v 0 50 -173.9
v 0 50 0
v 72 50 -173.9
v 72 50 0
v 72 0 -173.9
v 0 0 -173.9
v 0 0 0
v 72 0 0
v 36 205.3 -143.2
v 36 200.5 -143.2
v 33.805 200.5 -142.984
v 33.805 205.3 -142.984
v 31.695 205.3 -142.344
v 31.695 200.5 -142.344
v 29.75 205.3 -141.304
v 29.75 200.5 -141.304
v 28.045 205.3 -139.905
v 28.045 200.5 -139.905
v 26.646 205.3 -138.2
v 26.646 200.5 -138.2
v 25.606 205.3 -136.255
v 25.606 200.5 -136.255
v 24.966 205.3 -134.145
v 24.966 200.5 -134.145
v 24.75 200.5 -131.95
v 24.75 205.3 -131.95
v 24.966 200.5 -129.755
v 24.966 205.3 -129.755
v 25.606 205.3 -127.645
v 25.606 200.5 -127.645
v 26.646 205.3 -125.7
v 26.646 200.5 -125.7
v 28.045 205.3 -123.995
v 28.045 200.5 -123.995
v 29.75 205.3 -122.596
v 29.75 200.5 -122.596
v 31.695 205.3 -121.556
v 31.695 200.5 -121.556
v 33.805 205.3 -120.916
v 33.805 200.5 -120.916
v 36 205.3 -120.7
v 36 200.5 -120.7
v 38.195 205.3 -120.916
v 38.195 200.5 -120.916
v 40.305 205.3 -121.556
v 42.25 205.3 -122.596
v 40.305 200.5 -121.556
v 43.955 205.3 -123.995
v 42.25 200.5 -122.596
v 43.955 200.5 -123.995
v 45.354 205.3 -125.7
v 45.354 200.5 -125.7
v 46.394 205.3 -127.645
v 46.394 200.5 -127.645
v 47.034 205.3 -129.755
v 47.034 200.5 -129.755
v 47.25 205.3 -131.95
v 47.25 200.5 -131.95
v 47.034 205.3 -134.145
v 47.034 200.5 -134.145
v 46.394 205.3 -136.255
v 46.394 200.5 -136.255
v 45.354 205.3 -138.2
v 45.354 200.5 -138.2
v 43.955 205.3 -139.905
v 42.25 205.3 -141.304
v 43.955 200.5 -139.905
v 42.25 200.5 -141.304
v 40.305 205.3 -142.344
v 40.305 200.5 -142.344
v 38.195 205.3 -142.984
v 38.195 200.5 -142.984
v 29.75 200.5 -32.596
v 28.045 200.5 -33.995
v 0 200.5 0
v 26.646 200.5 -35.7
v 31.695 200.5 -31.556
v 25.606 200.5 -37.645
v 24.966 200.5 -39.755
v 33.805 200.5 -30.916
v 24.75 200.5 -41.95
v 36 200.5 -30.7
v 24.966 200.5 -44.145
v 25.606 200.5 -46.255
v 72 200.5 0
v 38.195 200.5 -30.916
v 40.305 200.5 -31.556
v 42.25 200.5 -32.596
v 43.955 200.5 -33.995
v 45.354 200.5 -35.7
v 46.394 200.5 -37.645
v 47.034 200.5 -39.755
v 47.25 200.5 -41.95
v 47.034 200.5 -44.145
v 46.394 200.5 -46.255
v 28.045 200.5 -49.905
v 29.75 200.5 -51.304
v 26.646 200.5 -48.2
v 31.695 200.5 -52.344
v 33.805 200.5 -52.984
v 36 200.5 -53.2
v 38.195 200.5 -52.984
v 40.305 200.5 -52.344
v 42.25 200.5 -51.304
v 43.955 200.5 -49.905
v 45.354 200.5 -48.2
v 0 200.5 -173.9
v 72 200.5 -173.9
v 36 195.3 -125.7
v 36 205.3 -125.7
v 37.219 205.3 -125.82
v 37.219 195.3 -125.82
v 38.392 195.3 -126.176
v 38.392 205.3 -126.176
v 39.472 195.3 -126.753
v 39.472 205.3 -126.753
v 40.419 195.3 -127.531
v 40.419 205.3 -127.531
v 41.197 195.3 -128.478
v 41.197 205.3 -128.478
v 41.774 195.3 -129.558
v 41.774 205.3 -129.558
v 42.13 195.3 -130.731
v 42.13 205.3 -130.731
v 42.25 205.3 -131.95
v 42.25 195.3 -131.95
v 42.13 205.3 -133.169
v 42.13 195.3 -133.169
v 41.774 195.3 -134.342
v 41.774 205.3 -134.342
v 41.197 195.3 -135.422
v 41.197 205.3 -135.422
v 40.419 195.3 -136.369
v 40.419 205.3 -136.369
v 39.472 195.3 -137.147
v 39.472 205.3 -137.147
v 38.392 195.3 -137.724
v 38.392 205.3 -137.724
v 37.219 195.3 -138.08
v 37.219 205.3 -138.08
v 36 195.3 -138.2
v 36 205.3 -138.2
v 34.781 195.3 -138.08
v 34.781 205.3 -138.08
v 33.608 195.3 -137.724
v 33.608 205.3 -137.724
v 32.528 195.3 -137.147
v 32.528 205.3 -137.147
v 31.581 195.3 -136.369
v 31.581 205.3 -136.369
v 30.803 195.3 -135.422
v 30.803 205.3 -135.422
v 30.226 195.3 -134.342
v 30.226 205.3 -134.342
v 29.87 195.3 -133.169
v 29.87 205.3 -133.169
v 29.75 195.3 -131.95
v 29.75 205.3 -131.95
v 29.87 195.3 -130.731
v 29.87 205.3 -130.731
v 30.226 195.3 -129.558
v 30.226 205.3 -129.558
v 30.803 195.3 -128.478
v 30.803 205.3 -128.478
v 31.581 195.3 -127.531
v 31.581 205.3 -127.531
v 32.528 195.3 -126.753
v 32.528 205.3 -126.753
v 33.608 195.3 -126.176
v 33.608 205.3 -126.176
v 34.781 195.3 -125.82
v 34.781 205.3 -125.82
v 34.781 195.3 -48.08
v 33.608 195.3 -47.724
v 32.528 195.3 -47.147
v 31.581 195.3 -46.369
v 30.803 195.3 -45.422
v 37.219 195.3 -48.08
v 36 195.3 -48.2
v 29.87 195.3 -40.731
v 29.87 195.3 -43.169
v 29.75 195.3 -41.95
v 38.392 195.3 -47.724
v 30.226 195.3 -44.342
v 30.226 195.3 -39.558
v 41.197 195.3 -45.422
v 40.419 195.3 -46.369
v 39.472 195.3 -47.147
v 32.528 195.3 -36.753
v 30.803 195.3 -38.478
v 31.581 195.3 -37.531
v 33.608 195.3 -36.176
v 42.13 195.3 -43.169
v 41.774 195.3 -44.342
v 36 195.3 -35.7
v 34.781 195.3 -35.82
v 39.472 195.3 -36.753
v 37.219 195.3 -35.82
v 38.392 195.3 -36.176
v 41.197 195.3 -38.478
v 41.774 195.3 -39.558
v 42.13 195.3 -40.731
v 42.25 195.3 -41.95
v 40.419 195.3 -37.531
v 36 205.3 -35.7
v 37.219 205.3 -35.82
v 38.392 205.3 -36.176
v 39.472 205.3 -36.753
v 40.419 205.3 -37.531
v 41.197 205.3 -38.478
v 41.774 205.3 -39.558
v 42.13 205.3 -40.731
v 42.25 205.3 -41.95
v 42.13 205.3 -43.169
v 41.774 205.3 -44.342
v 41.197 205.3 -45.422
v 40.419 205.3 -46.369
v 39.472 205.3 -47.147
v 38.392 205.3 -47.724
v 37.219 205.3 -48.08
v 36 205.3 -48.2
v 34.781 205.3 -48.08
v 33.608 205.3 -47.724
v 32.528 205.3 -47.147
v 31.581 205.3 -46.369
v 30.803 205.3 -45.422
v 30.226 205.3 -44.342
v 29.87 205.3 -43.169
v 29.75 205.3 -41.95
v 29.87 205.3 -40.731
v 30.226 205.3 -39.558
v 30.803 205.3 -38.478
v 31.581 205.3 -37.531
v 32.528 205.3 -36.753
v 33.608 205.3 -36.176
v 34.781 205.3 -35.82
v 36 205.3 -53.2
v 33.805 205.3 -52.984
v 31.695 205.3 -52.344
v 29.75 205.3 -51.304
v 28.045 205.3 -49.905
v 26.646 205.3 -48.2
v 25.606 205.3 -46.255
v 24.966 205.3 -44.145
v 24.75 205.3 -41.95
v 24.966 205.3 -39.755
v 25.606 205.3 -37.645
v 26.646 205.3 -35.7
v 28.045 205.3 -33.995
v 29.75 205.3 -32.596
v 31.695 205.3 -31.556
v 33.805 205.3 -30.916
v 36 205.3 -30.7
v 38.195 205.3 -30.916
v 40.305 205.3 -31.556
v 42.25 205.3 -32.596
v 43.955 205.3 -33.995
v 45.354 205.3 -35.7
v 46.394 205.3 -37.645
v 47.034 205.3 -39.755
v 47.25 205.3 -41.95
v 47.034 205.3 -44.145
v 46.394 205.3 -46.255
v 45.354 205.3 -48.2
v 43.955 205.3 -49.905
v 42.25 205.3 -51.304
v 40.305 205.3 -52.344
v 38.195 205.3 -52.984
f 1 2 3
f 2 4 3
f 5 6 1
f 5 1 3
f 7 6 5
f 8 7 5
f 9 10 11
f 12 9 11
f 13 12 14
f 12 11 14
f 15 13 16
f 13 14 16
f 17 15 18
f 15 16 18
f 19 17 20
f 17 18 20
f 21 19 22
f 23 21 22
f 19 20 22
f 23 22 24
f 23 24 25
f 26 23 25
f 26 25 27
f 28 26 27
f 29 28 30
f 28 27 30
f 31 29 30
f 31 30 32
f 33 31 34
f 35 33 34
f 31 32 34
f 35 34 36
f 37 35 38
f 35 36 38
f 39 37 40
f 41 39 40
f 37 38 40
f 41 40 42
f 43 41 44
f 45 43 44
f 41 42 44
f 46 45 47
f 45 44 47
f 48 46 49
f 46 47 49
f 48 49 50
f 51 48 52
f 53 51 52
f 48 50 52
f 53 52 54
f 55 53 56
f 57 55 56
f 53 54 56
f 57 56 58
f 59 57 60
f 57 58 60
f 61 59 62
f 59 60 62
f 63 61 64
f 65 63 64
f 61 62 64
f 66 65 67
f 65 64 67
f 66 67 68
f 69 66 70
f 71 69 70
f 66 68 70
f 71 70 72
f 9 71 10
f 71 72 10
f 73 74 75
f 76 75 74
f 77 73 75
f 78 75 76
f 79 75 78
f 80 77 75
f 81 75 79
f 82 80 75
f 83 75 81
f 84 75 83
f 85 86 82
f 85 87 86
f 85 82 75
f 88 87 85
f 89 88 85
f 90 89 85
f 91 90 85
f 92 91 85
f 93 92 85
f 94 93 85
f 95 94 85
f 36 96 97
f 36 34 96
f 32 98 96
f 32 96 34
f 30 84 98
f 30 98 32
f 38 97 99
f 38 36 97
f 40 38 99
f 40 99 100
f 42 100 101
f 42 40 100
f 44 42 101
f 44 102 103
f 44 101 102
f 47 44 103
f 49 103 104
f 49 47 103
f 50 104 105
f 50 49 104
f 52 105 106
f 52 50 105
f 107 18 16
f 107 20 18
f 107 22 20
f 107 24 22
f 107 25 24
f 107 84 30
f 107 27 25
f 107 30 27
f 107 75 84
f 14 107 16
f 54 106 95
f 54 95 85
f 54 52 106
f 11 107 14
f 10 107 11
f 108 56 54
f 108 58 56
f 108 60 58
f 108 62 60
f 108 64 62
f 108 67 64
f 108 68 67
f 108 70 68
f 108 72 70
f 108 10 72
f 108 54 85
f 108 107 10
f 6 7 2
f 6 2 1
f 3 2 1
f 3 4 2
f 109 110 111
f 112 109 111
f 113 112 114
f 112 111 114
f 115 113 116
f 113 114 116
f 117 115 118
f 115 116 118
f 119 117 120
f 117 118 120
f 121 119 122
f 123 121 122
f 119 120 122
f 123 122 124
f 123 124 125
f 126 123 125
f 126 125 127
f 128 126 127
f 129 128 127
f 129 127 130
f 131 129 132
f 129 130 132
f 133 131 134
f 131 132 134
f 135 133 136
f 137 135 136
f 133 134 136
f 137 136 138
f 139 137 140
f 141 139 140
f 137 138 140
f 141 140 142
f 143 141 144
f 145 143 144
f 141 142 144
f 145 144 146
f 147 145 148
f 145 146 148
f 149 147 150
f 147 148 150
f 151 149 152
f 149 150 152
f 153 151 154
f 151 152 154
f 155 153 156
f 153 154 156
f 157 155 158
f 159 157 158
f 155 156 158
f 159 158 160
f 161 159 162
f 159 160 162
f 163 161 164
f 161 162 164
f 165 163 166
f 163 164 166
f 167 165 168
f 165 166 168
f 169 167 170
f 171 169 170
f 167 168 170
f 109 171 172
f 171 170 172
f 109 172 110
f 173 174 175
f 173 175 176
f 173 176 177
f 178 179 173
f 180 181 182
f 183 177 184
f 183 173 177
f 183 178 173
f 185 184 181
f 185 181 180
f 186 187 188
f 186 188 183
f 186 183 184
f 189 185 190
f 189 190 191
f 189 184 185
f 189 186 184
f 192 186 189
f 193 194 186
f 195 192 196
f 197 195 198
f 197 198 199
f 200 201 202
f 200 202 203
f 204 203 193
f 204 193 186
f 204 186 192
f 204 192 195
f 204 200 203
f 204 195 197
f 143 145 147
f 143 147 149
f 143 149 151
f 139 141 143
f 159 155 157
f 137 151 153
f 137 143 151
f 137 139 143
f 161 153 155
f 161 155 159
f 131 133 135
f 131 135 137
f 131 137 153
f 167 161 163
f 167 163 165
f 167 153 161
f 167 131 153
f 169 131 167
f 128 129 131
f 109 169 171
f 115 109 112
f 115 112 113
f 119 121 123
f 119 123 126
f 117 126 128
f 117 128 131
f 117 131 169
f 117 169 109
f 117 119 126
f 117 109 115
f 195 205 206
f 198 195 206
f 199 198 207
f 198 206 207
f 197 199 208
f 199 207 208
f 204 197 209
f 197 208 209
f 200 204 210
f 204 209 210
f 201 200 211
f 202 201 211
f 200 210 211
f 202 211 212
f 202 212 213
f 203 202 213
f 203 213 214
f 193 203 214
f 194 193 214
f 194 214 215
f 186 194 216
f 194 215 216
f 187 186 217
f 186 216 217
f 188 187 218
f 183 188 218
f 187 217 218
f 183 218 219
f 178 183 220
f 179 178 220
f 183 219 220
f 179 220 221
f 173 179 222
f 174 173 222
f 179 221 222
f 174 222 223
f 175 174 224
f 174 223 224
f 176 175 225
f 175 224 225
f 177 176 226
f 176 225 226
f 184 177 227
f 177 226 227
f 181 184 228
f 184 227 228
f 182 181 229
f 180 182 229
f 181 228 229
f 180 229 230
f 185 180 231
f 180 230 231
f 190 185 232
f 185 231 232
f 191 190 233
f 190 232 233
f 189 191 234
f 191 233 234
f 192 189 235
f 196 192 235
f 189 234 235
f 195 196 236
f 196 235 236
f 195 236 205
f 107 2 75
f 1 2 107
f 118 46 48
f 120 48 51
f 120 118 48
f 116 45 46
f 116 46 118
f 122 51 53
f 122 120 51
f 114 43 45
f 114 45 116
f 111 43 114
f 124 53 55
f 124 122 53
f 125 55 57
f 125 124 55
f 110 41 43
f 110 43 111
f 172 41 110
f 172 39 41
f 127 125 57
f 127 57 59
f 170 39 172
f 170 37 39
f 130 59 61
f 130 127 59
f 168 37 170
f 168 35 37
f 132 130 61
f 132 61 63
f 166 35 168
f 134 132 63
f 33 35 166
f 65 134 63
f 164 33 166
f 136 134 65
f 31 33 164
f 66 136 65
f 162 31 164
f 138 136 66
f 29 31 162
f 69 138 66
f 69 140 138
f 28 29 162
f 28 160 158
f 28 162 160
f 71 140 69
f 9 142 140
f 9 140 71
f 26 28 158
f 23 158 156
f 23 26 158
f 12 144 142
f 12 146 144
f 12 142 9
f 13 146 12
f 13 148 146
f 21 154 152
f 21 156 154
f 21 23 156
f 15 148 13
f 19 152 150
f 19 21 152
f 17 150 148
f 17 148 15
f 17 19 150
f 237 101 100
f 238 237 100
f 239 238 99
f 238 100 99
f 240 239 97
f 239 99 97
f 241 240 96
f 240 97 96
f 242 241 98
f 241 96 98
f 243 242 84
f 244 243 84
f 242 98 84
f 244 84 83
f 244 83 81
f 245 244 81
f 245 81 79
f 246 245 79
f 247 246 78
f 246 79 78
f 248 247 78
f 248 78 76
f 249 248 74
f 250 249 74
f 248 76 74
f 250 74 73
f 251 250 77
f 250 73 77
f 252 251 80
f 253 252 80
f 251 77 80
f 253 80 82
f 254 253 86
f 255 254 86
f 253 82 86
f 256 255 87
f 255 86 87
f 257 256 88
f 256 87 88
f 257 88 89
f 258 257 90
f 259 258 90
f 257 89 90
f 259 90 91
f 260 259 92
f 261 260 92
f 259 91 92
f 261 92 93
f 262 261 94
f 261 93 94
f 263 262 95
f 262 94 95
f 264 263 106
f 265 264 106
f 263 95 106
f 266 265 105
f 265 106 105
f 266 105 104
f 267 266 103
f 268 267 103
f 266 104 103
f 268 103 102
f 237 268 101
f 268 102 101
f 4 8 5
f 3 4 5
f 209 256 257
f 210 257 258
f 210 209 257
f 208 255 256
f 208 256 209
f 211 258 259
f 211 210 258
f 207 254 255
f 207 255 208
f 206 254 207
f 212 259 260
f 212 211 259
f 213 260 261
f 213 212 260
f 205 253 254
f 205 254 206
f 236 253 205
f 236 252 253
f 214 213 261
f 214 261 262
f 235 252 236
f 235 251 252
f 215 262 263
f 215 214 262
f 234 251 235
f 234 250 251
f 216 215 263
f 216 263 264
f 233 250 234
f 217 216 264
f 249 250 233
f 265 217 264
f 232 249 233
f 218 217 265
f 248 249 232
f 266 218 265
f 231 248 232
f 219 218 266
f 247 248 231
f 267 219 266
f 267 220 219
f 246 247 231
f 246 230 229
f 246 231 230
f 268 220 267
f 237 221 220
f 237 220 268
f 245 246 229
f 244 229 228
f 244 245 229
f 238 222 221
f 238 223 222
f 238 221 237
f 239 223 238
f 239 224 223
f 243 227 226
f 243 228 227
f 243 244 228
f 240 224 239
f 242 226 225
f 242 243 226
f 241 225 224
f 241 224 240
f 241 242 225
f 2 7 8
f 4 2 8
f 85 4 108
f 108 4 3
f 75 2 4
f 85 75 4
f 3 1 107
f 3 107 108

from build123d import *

# Parameters (mm, degrees)
SKETCH1_W           = 72
SKETCH1_H           = 173.9
BOSS_EXTRUDE1_DEPTH = 200.5
SKETCH2_R           = 11.25
BOSS_EXTRUDE2_DEPTH = 4.8
SKETCH6_R           = 6.25
CUT_EXTRUDE1_DEPTH  = 10


with BuildPart() as part:
    # Sketch1 → Boss-Extrude1 (new body)
    with BuildSketch(Plane(origin=(0, 0, 0), x_dir=(1, 0, 0), z_dir=(0, 1, 0))):
        with Locations((36, 86.95)):
            Rectangle(SKETCH1_W, SKETCH1_H)
    extrude(amount=BOSS_EXTRUDE1_DEPTH)

    # Sketch2 → Boss-Extrude2 (add)
    with BuildSketch(Plane(origin=(0, 200.5, 0), x_dir=(1, 0, 0), z_dir=(0, 1, 0))):
        with Locations(Location((36, 131.95, 0), (0, 0, 90))):
            Circle(SKETCH2_R)
        with Locations(Location((36, 41.95, 0), (0, 0, 90))):
            Circle(SKETCH2_R)
    extrude(amount=BOSS_EXTRUDE2_DEPTH)


with BuildPart() as body_2:
    # Split1: the piece on the far side of the plane
    add(part.part)
    split(bisect_by=Plane(origin=(0, 50, 0), x_dir=(0, 0, -1), z_dir=(0, -1, 0)), keep=Keep.BOTTOM)

    # Sketch6 → Cut-Extrude1 (cut)
    with BuildSketch(Plane(origin=(0, 205.3, 0), x_dir=(1, 0, 0), z_dir=(0, 1, 0))):
        with Locations(Location((36, 131.95, 0), (0, 0, 270))):
            Circle(SKETCH6_R)
        with Locations(Location((36, 41.95, 0), (0, 0, 270))):
            Circle(SKETCH6_R)
    extrude(amount=-CUT_EXTRUDE1_DEPTH, mode=Mode.SUBTRACT)


with BuildPart() as part_1:
    add(part.part)

    # Split1
    split(bisect_by=Plane(origin=(0, 50, 0), x_dir=(0, 0, -1), z_dir=(0, -1, 0)), keep=Keep.TOP)


solid = Compound([body_2.part, part_1.part])
